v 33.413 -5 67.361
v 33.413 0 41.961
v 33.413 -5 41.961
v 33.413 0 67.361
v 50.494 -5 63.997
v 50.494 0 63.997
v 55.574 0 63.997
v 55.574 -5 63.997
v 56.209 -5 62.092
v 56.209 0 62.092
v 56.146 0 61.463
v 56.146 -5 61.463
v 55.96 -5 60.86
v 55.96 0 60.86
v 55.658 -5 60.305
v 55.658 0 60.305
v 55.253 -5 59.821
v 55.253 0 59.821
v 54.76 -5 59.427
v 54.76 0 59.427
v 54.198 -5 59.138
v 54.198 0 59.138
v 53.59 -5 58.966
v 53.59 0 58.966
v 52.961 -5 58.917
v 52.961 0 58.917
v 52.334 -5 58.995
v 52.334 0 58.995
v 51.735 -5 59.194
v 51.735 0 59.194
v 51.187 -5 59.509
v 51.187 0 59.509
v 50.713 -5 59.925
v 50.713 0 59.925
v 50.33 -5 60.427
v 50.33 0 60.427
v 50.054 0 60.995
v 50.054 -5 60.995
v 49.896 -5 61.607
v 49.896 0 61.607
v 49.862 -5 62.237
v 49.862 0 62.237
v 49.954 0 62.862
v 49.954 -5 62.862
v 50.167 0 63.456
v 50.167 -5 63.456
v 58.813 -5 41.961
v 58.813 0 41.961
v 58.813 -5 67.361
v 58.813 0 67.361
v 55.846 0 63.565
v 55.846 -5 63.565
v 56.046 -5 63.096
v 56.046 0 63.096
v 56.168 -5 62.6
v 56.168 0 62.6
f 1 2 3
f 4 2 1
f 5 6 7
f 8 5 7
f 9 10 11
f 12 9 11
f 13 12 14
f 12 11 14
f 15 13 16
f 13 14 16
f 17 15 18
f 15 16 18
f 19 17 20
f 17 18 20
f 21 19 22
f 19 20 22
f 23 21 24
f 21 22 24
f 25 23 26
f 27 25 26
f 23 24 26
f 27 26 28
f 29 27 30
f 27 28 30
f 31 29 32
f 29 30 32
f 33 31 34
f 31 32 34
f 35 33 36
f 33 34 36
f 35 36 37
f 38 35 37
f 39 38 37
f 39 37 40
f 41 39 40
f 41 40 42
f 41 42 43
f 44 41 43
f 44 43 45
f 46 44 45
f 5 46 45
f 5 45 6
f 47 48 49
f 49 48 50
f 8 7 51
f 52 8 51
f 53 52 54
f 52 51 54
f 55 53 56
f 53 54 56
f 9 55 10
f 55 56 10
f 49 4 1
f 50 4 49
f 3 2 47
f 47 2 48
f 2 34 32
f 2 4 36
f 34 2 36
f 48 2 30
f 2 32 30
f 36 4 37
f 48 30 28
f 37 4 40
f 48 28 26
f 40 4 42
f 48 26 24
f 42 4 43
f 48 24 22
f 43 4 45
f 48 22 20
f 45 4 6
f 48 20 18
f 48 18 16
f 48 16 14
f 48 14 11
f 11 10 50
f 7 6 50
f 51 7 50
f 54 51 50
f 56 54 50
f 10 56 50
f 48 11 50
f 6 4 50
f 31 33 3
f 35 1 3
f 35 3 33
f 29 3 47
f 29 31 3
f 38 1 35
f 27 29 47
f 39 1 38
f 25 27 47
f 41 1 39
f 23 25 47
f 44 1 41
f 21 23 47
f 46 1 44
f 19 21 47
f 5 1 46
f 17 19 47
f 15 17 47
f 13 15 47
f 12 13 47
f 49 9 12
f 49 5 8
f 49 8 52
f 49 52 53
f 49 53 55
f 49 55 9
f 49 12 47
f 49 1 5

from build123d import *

# Parameters (mm, degrees)
F0_W     = 25.4
F0_H     = 25.4
F1_DEPTH = 5


with BuildPart() as f1:
    # F0 (on Front) → F1 (new body)
    with BuildSketch(Plane.XZ):
        with Locations((46.112889, 54.660929)):
            Rectangle(F0_W, F0_H)
        with BuildLine():
            ThreePointArc((55.573677, 63.996648), (56.045747, 63.095671), (56.208677, 62.091648))
            ThreePointArc((56.208677, 62.091648), (52.029654, 59.079578), (50.493677, 63.996648))
            ThreePointArc((50.493677, 63.996648), (53.033677, 65.266648), (55.573677, 63.996648))
        make_face(mode=Mode.SUBTRACT)
        with BuildLine():
            Line((50.493677, 63.996648), (55.573677, 63.996648))
            ThreePointArc((55.573677, 63.996648), (53.033677, 65.266648), (50.493677, 63.996648))
        make_face()
    extrude(amount=F1_DEPTH)


solid = f1.part
